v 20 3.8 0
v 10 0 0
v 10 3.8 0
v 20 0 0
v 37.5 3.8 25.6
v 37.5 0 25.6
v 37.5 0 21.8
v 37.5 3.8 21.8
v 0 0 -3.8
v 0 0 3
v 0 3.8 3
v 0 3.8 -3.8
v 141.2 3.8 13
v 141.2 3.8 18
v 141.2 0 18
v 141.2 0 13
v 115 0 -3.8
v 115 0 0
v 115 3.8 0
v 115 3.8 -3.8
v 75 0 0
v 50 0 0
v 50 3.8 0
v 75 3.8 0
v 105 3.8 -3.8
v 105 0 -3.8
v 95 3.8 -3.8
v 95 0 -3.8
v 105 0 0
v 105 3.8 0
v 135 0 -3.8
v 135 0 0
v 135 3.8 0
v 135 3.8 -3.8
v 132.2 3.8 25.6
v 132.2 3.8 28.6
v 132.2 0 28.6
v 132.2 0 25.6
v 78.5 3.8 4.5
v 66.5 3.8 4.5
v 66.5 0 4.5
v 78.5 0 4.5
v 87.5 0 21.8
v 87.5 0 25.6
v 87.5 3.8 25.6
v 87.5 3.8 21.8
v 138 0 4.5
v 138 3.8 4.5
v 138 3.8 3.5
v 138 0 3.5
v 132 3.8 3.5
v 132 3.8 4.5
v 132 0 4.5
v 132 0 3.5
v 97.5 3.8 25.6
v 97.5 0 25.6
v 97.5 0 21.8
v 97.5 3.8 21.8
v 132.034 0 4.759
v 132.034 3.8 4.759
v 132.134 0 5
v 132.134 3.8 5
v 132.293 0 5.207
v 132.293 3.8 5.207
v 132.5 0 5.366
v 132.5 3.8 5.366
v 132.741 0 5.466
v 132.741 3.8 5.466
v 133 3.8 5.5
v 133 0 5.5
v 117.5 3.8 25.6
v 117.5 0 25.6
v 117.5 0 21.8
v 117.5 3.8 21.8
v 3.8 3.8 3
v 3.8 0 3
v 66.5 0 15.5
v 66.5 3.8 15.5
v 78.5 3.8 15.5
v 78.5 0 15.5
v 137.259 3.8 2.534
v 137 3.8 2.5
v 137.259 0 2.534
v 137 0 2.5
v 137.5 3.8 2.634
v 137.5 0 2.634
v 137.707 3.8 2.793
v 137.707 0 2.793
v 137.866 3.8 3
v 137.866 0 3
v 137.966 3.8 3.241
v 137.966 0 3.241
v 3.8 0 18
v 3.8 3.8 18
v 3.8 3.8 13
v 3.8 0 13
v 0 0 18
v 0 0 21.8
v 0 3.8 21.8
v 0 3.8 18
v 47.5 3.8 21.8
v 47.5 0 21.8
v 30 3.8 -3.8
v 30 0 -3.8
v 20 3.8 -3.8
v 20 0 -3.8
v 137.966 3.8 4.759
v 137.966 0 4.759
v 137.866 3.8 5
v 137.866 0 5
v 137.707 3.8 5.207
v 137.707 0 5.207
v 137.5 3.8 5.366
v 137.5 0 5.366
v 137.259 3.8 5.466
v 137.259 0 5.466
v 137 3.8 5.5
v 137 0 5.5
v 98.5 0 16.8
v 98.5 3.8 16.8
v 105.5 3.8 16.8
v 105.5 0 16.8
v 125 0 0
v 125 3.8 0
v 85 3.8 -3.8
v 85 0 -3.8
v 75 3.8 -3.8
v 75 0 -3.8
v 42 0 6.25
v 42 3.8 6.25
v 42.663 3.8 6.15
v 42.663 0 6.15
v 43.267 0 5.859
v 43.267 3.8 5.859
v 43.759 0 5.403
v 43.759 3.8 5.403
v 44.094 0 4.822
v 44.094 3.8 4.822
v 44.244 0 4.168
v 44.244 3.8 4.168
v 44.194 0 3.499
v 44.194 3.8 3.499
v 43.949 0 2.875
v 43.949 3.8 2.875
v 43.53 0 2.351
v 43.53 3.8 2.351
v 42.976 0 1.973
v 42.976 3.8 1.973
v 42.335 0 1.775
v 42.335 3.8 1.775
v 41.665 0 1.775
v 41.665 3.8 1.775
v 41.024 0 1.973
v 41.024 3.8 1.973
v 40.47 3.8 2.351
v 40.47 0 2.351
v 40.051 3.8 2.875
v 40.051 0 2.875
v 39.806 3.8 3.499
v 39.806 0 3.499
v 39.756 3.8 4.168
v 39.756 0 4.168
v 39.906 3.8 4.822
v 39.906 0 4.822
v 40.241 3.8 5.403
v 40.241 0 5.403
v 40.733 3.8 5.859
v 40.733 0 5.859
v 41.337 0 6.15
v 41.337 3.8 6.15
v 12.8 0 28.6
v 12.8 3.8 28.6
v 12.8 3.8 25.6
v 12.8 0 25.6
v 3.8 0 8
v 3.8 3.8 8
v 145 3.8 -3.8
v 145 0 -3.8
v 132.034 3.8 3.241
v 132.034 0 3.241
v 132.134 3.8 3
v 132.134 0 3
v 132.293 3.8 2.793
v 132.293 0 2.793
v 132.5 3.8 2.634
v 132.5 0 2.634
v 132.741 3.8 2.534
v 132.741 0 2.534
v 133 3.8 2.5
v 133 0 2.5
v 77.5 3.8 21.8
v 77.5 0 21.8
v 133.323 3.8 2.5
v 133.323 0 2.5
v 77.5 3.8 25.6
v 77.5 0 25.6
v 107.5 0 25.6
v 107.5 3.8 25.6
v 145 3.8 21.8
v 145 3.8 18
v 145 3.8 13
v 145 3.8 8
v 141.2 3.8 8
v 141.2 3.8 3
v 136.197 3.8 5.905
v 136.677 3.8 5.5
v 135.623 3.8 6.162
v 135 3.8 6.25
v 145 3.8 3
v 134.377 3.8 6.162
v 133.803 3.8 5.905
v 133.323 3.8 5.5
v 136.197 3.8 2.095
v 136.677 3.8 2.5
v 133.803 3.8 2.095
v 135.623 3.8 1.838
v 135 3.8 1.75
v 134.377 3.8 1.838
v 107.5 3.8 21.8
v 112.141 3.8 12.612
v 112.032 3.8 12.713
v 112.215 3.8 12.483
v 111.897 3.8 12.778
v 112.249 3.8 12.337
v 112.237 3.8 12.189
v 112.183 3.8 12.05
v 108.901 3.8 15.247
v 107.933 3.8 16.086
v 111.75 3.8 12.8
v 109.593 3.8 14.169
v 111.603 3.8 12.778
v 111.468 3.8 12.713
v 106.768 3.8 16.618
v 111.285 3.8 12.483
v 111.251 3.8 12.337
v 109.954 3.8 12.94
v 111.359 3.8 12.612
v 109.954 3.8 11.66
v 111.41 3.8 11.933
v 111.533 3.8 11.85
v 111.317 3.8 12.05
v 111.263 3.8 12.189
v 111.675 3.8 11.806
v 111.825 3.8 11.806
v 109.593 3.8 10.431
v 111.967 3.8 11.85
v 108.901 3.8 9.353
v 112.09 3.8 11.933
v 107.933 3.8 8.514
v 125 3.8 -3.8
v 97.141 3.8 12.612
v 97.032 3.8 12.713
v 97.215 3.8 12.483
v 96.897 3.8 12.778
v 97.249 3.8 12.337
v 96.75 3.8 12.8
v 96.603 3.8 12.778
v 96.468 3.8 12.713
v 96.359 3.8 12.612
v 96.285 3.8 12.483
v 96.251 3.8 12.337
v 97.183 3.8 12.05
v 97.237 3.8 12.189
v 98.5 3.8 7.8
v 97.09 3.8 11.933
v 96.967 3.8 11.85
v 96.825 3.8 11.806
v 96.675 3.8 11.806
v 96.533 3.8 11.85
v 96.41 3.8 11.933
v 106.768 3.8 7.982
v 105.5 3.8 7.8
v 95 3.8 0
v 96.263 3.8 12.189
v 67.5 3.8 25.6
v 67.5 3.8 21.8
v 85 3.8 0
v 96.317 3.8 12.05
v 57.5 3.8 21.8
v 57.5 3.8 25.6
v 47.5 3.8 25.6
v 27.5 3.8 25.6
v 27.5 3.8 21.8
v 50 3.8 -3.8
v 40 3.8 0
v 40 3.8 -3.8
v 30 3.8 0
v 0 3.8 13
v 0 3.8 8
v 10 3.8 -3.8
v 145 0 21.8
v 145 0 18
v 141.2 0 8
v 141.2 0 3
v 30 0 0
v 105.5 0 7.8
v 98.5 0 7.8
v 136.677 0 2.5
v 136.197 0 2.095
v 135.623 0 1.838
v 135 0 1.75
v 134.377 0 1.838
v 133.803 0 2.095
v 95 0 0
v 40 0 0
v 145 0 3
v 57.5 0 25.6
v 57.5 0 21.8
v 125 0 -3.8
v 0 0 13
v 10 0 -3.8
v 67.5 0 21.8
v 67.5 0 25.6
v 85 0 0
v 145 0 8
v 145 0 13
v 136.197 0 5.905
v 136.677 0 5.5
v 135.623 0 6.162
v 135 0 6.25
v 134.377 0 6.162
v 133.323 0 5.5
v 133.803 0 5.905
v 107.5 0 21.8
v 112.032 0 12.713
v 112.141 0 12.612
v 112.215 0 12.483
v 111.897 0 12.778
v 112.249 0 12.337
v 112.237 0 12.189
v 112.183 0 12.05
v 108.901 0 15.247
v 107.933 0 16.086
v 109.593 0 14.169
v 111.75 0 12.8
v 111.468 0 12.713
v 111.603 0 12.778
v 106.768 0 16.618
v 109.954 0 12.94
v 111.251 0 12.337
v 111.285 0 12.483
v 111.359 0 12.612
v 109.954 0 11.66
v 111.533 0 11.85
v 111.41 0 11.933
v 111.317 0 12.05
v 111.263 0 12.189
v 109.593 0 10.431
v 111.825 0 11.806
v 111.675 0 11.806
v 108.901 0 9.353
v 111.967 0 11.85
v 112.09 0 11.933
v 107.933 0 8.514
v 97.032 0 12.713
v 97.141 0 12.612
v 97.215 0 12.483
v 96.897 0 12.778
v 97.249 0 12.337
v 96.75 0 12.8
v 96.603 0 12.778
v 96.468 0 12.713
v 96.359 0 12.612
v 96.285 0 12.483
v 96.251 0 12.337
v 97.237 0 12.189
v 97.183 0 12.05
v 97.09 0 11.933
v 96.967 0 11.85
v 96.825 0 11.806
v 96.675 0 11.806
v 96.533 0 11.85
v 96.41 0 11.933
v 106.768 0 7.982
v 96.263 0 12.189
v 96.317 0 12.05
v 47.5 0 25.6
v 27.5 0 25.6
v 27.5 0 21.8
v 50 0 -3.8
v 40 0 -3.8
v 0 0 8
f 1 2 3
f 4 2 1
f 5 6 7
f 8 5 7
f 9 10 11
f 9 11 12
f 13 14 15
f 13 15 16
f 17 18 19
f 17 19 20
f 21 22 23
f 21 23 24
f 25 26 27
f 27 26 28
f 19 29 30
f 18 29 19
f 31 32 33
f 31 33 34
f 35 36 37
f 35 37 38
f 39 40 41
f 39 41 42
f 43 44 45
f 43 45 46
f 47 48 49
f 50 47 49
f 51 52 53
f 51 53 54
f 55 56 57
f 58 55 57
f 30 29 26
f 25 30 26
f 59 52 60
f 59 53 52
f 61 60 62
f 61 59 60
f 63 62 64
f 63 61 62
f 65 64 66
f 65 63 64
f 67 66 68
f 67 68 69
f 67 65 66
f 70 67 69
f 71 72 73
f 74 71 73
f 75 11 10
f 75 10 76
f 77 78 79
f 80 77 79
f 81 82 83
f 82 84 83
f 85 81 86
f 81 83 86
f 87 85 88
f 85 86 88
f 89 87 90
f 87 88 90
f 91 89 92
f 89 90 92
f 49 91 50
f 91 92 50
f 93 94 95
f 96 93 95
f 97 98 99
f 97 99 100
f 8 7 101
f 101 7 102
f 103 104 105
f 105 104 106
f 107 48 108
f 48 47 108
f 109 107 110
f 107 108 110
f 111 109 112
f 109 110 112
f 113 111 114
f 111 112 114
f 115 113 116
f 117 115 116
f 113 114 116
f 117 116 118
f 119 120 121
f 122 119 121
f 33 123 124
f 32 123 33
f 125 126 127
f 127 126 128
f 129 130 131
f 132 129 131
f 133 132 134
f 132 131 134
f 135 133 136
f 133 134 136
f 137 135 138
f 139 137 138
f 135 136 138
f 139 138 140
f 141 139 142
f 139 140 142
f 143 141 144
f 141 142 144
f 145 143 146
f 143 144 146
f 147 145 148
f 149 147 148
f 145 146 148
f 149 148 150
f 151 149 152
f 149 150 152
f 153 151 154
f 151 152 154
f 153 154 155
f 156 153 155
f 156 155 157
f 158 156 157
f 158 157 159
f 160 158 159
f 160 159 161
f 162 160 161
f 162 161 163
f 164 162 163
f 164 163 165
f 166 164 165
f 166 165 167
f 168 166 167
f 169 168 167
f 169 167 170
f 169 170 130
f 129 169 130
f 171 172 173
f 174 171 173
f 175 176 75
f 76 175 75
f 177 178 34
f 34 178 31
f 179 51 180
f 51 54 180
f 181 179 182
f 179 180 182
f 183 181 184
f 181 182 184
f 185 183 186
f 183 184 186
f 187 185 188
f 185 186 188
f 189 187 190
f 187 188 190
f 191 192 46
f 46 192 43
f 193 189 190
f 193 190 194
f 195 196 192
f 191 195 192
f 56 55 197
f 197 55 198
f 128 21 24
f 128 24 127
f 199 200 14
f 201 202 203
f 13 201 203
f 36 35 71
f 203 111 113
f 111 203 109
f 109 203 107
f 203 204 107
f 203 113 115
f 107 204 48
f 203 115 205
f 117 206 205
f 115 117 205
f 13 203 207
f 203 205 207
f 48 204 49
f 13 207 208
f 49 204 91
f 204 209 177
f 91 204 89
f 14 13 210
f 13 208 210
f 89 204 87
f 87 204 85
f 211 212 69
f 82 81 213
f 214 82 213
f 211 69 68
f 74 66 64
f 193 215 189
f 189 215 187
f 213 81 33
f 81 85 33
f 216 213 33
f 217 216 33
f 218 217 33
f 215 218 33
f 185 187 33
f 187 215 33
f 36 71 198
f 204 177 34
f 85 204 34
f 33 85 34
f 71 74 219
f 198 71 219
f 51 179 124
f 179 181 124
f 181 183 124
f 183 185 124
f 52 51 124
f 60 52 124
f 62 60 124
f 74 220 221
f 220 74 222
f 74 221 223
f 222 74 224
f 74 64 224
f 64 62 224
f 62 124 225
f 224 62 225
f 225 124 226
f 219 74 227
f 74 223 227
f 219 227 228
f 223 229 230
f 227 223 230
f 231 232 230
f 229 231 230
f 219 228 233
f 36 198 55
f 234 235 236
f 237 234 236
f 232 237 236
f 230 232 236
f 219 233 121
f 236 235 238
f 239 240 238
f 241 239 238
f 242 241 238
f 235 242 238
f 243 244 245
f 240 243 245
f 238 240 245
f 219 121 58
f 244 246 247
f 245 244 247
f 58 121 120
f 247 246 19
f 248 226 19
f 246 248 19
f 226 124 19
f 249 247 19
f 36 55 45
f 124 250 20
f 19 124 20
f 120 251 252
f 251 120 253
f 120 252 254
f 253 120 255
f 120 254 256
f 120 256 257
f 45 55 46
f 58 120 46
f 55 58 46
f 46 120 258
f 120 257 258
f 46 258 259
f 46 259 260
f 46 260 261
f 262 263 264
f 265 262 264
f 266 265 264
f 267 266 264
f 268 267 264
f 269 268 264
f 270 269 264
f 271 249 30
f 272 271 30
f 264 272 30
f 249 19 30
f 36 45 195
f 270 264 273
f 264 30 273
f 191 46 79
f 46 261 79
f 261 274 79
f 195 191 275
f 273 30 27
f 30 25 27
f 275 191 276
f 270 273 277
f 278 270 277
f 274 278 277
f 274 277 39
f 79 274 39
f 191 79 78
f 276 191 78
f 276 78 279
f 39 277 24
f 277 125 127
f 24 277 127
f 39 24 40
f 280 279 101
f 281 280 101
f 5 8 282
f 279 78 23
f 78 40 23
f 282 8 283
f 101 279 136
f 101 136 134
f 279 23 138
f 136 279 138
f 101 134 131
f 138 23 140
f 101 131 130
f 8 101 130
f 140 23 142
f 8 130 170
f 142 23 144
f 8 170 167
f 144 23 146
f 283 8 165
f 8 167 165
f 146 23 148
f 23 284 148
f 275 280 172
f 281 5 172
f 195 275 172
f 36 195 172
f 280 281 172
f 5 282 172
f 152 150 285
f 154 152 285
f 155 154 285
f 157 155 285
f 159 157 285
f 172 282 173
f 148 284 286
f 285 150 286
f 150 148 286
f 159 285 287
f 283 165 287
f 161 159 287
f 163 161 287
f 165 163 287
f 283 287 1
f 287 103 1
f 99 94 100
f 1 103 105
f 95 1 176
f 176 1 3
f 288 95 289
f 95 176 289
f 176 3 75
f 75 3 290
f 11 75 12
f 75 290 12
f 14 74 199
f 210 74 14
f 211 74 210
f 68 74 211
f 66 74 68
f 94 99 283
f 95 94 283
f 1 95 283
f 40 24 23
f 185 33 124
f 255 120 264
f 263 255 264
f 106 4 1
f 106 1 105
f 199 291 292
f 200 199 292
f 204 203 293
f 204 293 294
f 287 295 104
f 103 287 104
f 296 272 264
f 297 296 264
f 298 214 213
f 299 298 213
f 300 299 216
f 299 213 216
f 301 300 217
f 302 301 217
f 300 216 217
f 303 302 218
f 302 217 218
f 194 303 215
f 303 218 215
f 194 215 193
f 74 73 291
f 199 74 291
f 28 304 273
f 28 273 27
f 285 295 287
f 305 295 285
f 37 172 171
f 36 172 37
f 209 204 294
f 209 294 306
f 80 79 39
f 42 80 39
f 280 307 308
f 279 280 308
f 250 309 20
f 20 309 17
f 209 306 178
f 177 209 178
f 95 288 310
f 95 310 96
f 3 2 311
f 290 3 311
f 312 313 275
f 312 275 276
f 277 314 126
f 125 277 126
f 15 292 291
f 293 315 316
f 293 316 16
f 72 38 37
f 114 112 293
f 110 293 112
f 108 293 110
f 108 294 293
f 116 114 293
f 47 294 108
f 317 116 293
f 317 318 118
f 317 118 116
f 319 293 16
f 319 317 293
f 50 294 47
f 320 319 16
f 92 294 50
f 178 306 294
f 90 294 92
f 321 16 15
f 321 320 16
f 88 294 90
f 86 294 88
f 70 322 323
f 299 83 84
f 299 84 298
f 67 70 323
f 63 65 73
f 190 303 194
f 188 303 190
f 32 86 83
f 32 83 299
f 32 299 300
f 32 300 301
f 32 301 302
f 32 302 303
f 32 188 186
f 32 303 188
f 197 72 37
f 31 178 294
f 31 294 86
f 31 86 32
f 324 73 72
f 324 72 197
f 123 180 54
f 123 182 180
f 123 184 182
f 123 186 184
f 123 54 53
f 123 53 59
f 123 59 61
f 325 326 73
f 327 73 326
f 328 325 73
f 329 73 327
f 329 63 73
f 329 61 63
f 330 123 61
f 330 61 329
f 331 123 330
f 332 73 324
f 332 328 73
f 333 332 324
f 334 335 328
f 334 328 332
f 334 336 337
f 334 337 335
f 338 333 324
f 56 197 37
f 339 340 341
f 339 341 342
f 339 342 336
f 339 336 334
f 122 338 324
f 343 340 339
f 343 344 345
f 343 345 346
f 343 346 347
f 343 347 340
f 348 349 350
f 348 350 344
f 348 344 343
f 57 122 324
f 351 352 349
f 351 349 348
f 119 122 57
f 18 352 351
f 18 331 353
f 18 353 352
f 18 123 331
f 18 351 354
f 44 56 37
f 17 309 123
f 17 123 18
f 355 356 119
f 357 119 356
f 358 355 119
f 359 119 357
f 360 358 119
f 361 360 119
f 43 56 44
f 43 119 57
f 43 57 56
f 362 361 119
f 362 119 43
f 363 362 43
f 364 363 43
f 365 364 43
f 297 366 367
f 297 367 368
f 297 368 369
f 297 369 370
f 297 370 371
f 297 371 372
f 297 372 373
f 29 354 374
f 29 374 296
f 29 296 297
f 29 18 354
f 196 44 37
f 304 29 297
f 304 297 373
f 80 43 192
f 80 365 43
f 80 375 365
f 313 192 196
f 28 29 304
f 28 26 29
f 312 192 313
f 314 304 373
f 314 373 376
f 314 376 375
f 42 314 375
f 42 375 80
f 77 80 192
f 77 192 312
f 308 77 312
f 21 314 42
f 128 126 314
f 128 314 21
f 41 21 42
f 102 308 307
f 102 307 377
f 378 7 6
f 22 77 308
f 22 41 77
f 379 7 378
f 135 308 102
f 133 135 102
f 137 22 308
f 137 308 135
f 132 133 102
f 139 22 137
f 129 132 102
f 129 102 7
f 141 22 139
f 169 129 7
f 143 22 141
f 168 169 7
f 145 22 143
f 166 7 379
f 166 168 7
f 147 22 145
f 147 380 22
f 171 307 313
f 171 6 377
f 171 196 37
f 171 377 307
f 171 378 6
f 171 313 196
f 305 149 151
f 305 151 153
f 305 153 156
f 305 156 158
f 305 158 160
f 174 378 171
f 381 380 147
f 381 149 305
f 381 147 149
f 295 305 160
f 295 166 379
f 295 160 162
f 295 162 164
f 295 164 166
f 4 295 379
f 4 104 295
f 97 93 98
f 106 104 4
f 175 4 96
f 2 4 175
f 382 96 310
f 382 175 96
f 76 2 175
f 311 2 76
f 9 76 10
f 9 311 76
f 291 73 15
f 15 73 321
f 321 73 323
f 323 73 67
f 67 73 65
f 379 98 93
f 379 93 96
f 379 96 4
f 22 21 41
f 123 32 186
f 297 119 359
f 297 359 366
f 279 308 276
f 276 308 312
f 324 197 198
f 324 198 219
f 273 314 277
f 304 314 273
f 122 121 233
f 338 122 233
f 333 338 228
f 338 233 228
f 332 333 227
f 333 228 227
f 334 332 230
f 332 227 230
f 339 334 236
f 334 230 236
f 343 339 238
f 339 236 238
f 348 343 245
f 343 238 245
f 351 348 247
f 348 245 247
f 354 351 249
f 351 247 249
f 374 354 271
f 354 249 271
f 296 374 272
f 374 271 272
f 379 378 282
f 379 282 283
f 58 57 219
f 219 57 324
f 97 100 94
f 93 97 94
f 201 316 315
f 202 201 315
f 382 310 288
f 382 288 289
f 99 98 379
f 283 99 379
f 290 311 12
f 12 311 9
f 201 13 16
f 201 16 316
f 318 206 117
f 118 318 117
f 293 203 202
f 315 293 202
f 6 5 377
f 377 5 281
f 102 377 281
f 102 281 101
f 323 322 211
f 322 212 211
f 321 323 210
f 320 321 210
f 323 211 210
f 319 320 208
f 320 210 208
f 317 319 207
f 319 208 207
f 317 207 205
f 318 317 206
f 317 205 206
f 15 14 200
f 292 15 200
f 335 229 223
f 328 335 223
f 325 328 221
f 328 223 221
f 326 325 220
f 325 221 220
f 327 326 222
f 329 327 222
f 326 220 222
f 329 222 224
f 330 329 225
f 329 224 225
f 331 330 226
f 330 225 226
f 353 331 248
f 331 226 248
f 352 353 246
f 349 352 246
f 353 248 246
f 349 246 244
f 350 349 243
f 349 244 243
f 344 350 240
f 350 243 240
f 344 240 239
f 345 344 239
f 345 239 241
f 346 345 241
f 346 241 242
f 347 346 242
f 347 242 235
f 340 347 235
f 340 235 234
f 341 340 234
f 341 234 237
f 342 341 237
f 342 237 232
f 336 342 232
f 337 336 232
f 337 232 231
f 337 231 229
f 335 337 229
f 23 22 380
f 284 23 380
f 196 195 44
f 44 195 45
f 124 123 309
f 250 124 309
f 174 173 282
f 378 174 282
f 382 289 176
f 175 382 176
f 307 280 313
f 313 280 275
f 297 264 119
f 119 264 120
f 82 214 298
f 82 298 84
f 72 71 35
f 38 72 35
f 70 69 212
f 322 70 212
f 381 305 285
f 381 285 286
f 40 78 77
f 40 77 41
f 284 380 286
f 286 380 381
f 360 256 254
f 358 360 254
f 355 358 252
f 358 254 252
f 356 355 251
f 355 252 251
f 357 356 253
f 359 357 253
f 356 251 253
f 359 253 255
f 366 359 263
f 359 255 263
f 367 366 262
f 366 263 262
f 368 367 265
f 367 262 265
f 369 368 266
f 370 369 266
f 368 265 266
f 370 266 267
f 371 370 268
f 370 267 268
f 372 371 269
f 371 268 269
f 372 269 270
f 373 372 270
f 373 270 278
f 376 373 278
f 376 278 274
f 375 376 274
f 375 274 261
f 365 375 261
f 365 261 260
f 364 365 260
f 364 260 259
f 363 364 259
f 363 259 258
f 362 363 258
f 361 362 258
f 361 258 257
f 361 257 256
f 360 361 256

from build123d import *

# Parameters (mm, degrees)
SKETCH1_W           = 145
SKETCH1_H           = 21.8
BOSS_EXTRUDE1_DEPTH = 3.8
SKETCH2_W           = 12
SKETCH2_H           = 11
CUT_EXTRUDE1_DEPTH  = 147.678832829
SKETCH3_R           = 2.25
CUT_EXTRUDE2_DEPTH  = 147.678832829
SKETCH4_R           = 0.5
CUT_EXTRUDE3_DEPTH  = 147.678832829
SKETCH5_W           = 10
SKETCH5_H           = 3.8
BOSS_EXTRUDE2_DEPTH = 3.8
LPATTERN1_COUNT     = 4
LPATTERN1_PITCH     = 20
LPATTERN1_COL_COUNT = 4
LPATTERN1_COL_PITCH = 20
SKETCH6_W           = 145
SKETCH6_H           = 3
BOSS_EXTRUDE3_DEPTH = 3.8
SKETCH8_W           = 10
SKETCH8_H           = 3.8
CUT_EXTRUDE4_DEPTH  = 148.842483745
SKETCH9_W           = 3.8
SKETCH9_H           = 5
CUT_EXTRUDE5_DEPTH  = 148.842483745
SKETCH10_W          = 12.8
SKETCH10_H          = 3
CUT_EXTRUDE6_DEPTH  = 148.842483745
SKETCH11_W          = 10
SKETCH11_H          = 3.8
BOSS_EXTRUDE4_DEPTH = 3.8
LPATTERN2_COUNT     = 3
LPATTERN2_PITCH     = 20
SKETCH12_W          = 10
SKETCH12_H          = 3.8
BOSS_EXTRUDE5_DEPTH = 3.8
LPATTERN3_COUNT     = 4
LPATTERN3_PITCH     = 20
SKETCH13_W          = 6
SKETCH13_H          = 3
CUT_EXTRUDE7_DEPTH  = 148.842483745
FILLET1_R           = 1


with BuildPart() as part:
    # Sketch1 → Boss-Extrude1 (new body)
    with BuildSketch(Plane(origin=(0, 0, 0), x_dir=(1, 0, 0), z_dir=(0, 1, 0))):
        with Locations((72.5, -10.9)):
            Rectangle(SKETCH1_W, SKETCH1_H)
    extrude(amount=BOSS_EXTRUDE1_DEPTH)

    # Sketch2 → Cut-Extrude1 (cut, through all)
    with BuildSketch(Plane(origin=(0, 3.8, 0), x_dir=(1, 0, 0), z_dir=(0, 1, 0))):
        with Locations((72.5, -10)):
            Rectangle(SKETCH2_W, SKETCH2_H)
    extrude(amount=-CUT_EXTRUDE1_DEPTH, mode=Mode.SUBTRACT)

    # Sketch3 → Cut-Extrude2 (cut, through all)
    with BuildSketch(Plane(origin=(0, 3.8, 0), x_dir=(1, 0, 0), z_dir=(0, 1, 0))):
        with Locations(Location((42, -4, 0), (0, 0, 270))):
            Circle(SKETCH3_R)
        with Locations(Location((135, -4, 0), (0, 0, 270))):
            Circle(SKETCH3_R)
    extrude(amount=-CUT_EXTRUDE2_DEPTH, mode=Mode.SUBTRACT)

    # Sketch4 → Cut-Extrude3 (cut, through all)
    with BuildSketch(Plane(origin=(0, 3.8, 0), x_dir=(1, 0, 0), z_dir=(0, 1, 0))):
        with BuildLine():
            Line((98.5, -7.8), (98.5, -16.8))
            Line((98.5, -16.8), (105.5, -16.8))
            ThreePointArc((105.5, -16.8), (110, -12.300000006), (105.500000011, -7.8))
            Line((105.500000011, -7.8), (98.5, -7.8))
        make_face()
        with Locations(Location((96.75, -12.3, 0), (0, 0, 270))):
            Circle(SKETCH4_R)
        with Locations(Location((111.75, -12.3, 0), (0, 0, 270))):
            Circle(SKETCH4_R)
    extrude(amount=-CUT_EXTRUDE3_DEPTH, mode=Mode.SUBTRACT)

    # Sketch5 → Boss-Extrude2 (add, through all)
    with BuildSketch(Plane(origin=(0, 3.8, 0), x_dir=(1, 0, 0), z_dir=(0, 1, 0))):
        with Locations((72.5, -23.7)):
            Rectangle(SKETCH5_W, SKETCH5_H)
    boss_extrude2 = extrude(amount=-BOSS_EXTRUDE2_DEPTH)

    # LPattern1: Boss-Extrude2 ×4
    with Locations(*[(-i * LPATTERN1_PITCH, 0, 0) for i in range(1, LPATTERN1_COUNT)]):
        add(boss_extrude2)

    # LPattern1 col: Boss-Extrude2 ×4
    with Locations(*[(i * LPATTERN1_COL_PITCH, 0, 0) for i in range(1, LPATTERN1_COL_COUNT)]):
        add(boss_extrude2)

    # Sketch6 → Boss-Extrude3 (add, through all)
    with BuildSketch(Plane(origin=(0, 3.8, 0), x_dir=(1, 0, 0), z_dir=(0, 1, 0))):
        with Locations((72.5, -27.1)):
            Rectangle(SKETCH6_W, SKETCH6_H)
    extrude(amount=-BOSS_EXTRUDE3_DEPTH)

    # Sketch8 → Cut-Extrude4 (cut, through all)
    with BuildSketch(Plane(origin=(0, 0, 0), x_dir=(-1, 0, 0), z_dir=(0, -1, 0))):
        with Locations((-12.5, -23.7)):
            Rectangle(SKETCH8_W, SKETCH8_H)
        with Locations((-132.5, -23.7)):
            Rectangle(SKETCH8_W, SKETCH8_H)
    extrude(amount=-CUT_EXTRUDE4_DEPTH, mode=Mode.SUBTRACT)

    # Sketch9 → Cut-Extrude5 (cut, through all)
    with BuildSketch(Plane(origin=(0, 3.8, 0), x_dir=(1, 0, 0), z_dir=(0, 1, 0))):
        with Locations((1.9, -15.5)):
            Rectangle(SKETCH9_W, SKETCH9_H)
        with Locations((1.9, -5.5)):
            Rectangle(SKETCH9_W, SKETCH9_H)
        with Locations((143.1, -15.5)):
            Rectangle(SKETCH9_W, SKETCH9_H)
        with Locations((143.1, -5.5)):
            Rectangle(SKETCH9_W, SKETCH9_H)
    extrude(amount=-CUT_EXTRUDE5_DEPTH, mode=Mode.SUBTRACT)

    # Sketch10 → Cut-Extrude6 (cut, through all)
    with BuildSketch(Plane(origin=(0, 0, 0), x_dir=(-1, 0, 0), z_dir=(0, -1, 0))):
        with Locations((-6.4, -27.1)):
            Rectangle(SKETCH10_W, SKETCH10_H)
        with Locations((-138.6, -27.1)):
            Rectangle(SKETCH10_W, SKETCH10_H)
    extrude(amount=-CUT_EXTRUDE6_DEPTH, mode=Mode.SUBTRACT)

    # Sketch11 → Boss-Extrude4 (add, through all)
    with BuildSketch(Plane(origin=(0, 0, 0), x_dir=(-1, 0, 0), z_dir=(0, -1, 0))):
        with Locations((-5, 1.9)):
            Rectangle(SKETCH11_W, SKETCH11_H)
    boss_extrude4 = extrude(amount=-BOSS_EXTRUDE4_DEPTH)

    # LPattern2: Boss-Extrude4 ×3
    with Locations(*[(i * LPATTERN2_PITCH, 0, 0) for i in range(1, LPATTERN2_COUNT)]):
        add(boss_extrude4)

    # Sketch12 → Boss-Extrude5 (add, through all)
    with BuildSketch(Plane(origin=(0, 0, 0), x_dir=(-1, 0, 0), z_dir=(0, -1, 0))):
        with Locations((-140, 1.9)):
            Rectangle(SKETCH12_W, SKETCH12_H)
    boss_extrude5 = extrude(amount=-BOSS_EXTRUDE5_DEPTH)

    # LPattern3: Boss-Extrude5 ×4
    with Locations(*[(-i * LPATTERN3_PITCH, 0, 0) for i in range(1, LPATTERN3_COUNT)]):
        add(boss_extrude5)

    # Sketch13 → Cut-Extrude7 (cut, through all)
    with BuildSketch(Plane(origin=(0, 3.8, 0), x_dir=(1, 0, 0), z_dir=(0, 1, 0))):
        with Locations((135, -4)):
            Rectangle(SKETCH13_W, SKETCH13_H)
    extrude(amount=-CUT_EXTRUDE7_DEPTH, mode=Mode.SUBTRACT)

    # Fillet1
    fillet1_edges = [part.edges().sort_by_distance(p)[0] for p in [
        (138, 1.9, 5.5),
        (132, 1.9, 2.5),
        (138, 1.9, 2.5),
        (132, 1.9, 5.5),
    ]]
    fillet(fillet1_edges, radius=FILLET1_R)


solid = part.part
